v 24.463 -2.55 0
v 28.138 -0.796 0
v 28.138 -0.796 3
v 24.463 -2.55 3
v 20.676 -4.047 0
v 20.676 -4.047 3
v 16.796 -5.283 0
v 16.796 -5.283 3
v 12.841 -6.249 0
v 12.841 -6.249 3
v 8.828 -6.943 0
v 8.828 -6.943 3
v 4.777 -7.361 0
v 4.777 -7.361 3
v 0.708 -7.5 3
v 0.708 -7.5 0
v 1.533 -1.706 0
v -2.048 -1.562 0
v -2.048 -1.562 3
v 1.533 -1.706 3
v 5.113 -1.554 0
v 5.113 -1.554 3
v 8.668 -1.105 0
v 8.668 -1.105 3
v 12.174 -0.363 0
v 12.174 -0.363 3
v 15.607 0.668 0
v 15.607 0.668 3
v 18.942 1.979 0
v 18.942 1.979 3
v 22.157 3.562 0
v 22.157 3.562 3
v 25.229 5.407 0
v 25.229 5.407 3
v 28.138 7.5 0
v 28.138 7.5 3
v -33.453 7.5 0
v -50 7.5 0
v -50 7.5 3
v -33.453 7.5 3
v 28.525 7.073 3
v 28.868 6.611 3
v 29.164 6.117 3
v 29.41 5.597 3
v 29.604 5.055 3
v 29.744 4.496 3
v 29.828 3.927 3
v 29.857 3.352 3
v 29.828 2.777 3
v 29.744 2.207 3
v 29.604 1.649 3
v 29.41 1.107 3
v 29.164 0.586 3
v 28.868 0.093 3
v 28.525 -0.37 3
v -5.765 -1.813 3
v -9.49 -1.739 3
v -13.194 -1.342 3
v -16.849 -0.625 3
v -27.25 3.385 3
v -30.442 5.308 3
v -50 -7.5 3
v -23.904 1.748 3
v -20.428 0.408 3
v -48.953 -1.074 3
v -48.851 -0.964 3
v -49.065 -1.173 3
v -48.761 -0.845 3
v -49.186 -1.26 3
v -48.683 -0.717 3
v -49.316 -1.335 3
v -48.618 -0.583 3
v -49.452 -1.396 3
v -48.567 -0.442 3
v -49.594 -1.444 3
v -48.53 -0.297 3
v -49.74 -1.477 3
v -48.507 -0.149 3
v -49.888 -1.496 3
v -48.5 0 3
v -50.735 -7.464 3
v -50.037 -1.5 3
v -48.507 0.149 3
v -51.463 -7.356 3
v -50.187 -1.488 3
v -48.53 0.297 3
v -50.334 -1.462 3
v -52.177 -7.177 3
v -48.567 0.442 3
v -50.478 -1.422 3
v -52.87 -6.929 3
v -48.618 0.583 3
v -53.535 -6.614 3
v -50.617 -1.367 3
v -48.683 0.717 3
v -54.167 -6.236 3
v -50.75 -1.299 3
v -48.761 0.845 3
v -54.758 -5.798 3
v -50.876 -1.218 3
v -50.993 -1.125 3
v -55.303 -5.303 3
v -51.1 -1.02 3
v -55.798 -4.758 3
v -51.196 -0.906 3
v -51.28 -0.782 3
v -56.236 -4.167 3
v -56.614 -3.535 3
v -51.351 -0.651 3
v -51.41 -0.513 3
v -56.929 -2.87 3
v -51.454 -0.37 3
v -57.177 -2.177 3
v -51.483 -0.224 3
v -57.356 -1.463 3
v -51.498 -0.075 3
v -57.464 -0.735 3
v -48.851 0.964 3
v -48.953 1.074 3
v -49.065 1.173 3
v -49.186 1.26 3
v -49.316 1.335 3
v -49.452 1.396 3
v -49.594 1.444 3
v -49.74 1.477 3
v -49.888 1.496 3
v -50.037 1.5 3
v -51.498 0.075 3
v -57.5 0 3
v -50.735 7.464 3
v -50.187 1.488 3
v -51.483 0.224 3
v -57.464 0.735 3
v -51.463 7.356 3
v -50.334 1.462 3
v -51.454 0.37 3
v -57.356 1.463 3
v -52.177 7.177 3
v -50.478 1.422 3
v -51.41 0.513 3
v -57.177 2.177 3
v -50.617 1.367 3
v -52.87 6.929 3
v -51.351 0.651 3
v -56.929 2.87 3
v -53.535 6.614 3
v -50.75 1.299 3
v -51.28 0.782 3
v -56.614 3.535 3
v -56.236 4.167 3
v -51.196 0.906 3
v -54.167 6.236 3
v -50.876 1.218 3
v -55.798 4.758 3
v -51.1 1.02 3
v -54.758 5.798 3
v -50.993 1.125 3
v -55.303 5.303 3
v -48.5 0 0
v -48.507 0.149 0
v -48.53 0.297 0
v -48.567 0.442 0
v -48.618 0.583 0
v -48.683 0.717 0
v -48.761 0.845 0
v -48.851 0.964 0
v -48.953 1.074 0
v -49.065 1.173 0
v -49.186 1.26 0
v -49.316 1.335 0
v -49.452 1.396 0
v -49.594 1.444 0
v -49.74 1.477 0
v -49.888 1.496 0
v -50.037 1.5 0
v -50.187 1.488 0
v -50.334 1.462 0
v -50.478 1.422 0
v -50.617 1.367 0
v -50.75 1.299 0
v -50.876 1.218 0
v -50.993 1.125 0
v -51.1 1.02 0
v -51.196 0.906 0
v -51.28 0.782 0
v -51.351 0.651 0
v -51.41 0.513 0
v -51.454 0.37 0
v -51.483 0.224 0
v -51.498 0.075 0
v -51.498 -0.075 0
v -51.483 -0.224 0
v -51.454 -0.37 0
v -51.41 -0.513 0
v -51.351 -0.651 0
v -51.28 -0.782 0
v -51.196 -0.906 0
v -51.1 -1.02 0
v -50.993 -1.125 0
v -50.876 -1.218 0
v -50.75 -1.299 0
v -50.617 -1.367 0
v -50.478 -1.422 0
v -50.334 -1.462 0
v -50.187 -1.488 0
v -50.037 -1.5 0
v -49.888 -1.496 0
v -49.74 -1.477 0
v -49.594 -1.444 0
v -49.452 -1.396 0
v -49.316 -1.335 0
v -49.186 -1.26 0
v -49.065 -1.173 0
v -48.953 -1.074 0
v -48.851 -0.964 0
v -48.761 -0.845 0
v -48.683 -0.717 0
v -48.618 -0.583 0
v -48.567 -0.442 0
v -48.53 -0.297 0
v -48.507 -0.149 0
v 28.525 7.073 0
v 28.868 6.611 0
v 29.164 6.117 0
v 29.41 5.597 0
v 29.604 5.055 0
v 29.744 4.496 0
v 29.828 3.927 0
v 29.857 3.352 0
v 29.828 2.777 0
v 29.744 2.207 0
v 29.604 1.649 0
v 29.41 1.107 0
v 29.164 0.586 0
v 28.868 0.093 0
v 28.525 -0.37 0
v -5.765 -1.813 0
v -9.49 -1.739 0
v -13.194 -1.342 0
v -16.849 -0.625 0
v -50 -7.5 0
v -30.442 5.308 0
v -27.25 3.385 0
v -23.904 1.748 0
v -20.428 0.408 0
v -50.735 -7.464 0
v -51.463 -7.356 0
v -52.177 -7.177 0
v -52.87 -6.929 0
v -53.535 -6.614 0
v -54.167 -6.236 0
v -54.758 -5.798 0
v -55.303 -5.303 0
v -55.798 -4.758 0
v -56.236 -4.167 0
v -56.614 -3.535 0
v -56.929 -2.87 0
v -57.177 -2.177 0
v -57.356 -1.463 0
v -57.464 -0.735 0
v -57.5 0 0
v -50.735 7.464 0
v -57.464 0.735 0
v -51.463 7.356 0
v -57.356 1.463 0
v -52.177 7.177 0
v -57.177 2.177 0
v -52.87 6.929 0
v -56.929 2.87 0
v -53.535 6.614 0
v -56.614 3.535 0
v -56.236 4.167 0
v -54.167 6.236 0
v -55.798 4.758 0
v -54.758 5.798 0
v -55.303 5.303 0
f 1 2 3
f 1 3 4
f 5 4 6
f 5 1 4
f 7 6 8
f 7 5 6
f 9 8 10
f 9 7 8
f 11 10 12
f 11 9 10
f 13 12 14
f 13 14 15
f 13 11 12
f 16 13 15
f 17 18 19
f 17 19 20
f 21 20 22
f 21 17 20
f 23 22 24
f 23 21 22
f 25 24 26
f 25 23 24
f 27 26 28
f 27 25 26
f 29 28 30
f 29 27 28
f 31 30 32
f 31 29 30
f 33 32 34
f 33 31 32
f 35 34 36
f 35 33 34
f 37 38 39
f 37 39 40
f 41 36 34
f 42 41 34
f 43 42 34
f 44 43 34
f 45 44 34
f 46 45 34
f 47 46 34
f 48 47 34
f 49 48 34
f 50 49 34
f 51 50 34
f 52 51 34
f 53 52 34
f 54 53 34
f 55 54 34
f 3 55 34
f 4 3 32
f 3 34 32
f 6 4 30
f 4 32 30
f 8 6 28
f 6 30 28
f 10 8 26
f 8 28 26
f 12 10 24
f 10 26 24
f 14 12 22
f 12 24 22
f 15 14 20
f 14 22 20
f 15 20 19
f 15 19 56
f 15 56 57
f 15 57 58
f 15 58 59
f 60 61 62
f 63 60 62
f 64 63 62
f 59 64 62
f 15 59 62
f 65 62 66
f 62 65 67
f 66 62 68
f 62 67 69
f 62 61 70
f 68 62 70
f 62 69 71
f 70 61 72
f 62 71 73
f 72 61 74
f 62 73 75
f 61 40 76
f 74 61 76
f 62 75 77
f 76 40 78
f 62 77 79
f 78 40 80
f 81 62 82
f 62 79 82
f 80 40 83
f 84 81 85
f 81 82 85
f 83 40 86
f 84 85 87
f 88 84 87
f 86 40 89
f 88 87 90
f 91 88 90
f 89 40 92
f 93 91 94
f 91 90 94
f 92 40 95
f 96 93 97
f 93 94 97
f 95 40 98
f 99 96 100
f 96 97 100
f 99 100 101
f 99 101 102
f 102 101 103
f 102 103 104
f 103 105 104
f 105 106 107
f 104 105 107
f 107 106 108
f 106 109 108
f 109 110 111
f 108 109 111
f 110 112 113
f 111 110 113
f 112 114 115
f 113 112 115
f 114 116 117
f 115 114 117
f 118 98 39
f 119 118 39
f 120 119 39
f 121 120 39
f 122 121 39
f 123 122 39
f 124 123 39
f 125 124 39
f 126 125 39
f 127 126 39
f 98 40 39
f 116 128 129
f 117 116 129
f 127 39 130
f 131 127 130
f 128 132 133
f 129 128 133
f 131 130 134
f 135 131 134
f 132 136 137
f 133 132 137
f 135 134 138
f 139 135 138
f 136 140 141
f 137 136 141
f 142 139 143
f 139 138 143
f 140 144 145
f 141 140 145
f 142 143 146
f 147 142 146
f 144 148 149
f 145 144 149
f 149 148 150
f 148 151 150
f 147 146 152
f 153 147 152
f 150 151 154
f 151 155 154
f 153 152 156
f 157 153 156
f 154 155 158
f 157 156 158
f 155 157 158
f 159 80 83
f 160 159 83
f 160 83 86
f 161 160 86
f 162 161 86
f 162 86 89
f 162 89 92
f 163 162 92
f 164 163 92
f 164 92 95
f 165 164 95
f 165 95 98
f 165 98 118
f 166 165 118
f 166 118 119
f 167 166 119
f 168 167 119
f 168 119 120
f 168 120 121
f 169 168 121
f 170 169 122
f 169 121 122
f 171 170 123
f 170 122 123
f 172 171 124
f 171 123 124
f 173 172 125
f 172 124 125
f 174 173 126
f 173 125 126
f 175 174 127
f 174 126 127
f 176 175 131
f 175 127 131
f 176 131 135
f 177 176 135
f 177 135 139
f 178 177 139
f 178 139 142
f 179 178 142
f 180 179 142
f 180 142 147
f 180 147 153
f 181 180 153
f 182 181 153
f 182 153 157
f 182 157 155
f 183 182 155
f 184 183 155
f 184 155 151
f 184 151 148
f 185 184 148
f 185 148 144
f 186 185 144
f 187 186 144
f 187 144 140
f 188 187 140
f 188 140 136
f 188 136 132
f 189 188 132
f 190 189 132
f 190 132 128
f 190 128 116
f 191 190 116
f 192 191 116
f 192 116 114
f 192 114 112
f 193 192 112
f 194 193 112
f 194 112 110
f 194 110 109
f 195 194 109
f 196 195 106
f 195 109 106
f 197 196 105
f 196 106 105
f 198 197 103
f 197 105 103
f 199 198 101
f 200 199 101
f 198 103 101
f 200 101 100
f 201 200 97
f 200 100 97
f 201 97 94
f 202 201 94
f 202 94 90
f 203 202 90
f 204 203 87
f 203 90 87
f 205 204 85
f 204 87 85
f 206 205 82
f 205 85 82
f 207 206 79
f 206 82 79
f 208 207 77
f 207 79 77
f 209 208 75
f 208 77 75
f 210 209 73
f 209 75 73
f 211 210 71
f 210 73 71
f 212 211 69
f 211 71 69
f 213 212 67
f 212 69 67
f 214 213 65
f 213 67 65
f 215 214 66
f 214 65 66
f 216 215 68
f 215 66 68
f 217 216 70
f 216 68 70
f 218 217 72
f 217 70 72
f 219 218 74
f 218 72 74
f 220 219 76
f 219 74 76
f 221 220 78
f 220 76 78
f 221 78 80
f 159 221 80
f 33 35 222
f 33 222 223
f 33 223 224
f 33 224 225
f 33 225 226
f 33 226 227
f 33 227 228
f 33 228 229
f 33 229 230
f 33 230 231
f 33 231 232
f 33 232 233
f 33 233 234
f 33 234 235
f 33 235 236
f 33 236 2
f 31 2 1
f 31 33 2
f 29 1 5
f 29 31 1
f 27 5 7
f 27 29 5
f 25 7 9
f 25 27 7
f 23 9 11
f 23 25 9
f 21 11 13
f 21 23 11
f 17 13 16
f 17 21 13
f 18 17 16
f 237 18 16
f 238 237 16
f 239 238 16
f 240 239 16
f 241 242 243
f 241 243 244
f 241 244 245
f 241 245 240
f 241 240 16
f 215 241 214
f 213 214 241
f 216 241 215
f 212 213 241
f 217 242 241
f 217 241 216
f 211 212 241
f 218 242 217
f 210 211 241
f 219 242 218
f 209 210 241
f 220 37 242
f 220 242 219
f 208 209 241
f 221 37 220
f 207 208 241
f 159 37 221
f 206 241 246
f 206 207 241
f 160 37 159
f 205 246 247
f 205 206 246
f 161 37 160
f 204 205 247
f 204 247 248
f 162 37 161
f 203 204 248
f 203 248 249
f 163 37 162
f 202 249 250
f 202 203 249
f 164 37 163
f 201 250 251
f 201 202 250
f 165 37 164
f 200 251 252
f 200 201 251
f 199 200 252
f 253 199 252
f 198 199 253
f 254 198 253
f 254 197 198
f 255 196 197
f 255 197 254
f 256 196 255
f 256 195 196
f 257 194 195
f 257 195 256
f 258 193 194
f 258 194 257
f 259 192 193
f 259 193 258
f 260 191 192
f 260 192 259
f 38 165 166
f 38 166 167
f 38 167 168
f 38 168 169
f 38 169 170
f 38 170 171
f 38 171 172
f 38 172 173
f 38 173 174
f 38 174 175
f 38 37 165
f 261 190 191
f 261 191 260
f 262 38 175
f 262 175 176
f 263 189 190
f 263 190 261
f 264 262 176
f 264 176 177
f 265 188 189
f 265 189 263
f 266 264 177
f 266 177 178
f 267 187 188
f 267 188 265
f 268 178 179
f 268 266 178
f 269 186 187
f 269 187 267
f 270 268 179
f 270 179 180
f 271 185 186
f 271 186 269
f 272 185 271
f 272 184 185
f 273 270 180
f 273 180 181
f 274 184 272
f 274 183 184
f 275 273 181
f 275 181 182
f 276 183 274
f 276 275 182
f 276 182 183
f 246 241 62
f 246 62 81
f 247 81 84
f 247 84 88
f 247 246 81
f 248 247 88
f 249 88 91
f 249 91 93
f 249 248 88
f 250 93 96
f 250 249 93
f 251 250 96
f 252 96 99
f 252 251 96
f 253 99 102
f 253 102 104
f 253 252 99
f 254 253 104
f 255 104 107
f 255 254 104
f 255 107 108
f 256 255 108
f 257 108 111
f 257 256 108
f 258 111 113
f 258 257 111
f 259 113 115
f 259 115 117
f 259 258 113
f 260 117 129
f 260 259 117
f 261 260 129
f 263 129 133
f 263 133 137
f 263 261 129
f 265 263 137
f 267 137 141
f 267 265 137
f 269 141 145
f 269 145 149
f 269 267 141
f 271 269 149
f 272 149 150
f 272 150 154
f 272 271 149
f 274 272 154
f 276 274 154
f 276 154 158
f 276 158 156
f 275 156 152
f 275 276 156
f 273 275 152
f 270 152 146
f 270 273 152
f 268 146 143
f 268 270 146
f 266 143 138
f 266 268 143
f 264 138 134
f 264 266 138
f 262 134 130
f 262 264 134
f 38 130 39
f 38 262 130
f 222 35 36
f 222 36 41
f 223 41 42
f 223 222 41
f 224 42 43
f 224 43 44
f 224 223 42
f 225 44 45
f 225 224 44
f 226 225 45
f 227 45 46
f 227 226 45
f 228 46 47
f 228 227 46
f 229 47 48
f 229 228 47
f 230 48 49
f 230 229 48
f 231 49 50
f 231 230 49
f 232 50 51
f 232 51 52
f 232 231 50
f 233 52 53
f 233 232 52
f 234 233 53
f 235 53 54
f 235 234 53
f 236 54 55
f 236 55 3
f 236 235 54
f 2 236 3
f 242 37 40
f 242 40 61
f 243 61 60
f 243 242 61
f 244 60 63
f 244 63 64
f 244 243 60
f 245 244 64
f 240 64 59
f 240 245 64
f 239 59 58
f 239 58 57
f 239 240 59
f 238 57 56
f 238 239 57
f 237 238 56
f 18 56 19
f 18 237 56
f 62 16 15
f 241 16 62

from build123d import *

# Parameters (mm, degrees)
Y_KSEKLIK_EKSTR_ZYON1_DEPTH = 3
IZIM2_R                     = 1.5
KES_EKSTR_ZYON1_DEPTH       = 12.5


with BuildPart() as part:
    # Çizim1 → Yükseklik-Ekstrüzyon1 (new body)
    with BuildSketch(Plane.XY):
        with BuildLine():
            Line((-50, 7.5), (-33.453317398, 7.5))
            ThreePointArc((-33.453317398, 7.5), (-18.650063238, -0.147459849), (-2.048249465, -1.561586909))
            ThreePointArc((-2.048249465, -1.561586909), (13.901303084, 0.11670329), (28.138290623, 7.5))
            ThreePointArc((28.138290623, 7.5), (29.856514488, 3.351840642), (28.138290623, -0.796318716))
            ThreePointArc((28.138290623, -0.796318716), (14.826618758, -5.799776605), (0.707679736, -7.5))
            Line((0.707679736, -7.5), (-50, -7.5))
            ThreePointArc((-50, -7.5), (-57.5, 0), (-50, 7.5))
        make_face()
    extrude(amount=Y_KSEKLIK_EKSTR_ZYON1_DEPTH)

    # Çizim2 → Kes-Ekstrüzyon1 (cut)
    with BuildSketch(Plane.XY.offset(3)):
        with Locations((-50, 0)):
            Circle(IZIM2_R)
    extrude(amount=-KES_EKSTR_ZYON1_DEPTH, mode=Mode.SUBTRACT)


solid = part.part
